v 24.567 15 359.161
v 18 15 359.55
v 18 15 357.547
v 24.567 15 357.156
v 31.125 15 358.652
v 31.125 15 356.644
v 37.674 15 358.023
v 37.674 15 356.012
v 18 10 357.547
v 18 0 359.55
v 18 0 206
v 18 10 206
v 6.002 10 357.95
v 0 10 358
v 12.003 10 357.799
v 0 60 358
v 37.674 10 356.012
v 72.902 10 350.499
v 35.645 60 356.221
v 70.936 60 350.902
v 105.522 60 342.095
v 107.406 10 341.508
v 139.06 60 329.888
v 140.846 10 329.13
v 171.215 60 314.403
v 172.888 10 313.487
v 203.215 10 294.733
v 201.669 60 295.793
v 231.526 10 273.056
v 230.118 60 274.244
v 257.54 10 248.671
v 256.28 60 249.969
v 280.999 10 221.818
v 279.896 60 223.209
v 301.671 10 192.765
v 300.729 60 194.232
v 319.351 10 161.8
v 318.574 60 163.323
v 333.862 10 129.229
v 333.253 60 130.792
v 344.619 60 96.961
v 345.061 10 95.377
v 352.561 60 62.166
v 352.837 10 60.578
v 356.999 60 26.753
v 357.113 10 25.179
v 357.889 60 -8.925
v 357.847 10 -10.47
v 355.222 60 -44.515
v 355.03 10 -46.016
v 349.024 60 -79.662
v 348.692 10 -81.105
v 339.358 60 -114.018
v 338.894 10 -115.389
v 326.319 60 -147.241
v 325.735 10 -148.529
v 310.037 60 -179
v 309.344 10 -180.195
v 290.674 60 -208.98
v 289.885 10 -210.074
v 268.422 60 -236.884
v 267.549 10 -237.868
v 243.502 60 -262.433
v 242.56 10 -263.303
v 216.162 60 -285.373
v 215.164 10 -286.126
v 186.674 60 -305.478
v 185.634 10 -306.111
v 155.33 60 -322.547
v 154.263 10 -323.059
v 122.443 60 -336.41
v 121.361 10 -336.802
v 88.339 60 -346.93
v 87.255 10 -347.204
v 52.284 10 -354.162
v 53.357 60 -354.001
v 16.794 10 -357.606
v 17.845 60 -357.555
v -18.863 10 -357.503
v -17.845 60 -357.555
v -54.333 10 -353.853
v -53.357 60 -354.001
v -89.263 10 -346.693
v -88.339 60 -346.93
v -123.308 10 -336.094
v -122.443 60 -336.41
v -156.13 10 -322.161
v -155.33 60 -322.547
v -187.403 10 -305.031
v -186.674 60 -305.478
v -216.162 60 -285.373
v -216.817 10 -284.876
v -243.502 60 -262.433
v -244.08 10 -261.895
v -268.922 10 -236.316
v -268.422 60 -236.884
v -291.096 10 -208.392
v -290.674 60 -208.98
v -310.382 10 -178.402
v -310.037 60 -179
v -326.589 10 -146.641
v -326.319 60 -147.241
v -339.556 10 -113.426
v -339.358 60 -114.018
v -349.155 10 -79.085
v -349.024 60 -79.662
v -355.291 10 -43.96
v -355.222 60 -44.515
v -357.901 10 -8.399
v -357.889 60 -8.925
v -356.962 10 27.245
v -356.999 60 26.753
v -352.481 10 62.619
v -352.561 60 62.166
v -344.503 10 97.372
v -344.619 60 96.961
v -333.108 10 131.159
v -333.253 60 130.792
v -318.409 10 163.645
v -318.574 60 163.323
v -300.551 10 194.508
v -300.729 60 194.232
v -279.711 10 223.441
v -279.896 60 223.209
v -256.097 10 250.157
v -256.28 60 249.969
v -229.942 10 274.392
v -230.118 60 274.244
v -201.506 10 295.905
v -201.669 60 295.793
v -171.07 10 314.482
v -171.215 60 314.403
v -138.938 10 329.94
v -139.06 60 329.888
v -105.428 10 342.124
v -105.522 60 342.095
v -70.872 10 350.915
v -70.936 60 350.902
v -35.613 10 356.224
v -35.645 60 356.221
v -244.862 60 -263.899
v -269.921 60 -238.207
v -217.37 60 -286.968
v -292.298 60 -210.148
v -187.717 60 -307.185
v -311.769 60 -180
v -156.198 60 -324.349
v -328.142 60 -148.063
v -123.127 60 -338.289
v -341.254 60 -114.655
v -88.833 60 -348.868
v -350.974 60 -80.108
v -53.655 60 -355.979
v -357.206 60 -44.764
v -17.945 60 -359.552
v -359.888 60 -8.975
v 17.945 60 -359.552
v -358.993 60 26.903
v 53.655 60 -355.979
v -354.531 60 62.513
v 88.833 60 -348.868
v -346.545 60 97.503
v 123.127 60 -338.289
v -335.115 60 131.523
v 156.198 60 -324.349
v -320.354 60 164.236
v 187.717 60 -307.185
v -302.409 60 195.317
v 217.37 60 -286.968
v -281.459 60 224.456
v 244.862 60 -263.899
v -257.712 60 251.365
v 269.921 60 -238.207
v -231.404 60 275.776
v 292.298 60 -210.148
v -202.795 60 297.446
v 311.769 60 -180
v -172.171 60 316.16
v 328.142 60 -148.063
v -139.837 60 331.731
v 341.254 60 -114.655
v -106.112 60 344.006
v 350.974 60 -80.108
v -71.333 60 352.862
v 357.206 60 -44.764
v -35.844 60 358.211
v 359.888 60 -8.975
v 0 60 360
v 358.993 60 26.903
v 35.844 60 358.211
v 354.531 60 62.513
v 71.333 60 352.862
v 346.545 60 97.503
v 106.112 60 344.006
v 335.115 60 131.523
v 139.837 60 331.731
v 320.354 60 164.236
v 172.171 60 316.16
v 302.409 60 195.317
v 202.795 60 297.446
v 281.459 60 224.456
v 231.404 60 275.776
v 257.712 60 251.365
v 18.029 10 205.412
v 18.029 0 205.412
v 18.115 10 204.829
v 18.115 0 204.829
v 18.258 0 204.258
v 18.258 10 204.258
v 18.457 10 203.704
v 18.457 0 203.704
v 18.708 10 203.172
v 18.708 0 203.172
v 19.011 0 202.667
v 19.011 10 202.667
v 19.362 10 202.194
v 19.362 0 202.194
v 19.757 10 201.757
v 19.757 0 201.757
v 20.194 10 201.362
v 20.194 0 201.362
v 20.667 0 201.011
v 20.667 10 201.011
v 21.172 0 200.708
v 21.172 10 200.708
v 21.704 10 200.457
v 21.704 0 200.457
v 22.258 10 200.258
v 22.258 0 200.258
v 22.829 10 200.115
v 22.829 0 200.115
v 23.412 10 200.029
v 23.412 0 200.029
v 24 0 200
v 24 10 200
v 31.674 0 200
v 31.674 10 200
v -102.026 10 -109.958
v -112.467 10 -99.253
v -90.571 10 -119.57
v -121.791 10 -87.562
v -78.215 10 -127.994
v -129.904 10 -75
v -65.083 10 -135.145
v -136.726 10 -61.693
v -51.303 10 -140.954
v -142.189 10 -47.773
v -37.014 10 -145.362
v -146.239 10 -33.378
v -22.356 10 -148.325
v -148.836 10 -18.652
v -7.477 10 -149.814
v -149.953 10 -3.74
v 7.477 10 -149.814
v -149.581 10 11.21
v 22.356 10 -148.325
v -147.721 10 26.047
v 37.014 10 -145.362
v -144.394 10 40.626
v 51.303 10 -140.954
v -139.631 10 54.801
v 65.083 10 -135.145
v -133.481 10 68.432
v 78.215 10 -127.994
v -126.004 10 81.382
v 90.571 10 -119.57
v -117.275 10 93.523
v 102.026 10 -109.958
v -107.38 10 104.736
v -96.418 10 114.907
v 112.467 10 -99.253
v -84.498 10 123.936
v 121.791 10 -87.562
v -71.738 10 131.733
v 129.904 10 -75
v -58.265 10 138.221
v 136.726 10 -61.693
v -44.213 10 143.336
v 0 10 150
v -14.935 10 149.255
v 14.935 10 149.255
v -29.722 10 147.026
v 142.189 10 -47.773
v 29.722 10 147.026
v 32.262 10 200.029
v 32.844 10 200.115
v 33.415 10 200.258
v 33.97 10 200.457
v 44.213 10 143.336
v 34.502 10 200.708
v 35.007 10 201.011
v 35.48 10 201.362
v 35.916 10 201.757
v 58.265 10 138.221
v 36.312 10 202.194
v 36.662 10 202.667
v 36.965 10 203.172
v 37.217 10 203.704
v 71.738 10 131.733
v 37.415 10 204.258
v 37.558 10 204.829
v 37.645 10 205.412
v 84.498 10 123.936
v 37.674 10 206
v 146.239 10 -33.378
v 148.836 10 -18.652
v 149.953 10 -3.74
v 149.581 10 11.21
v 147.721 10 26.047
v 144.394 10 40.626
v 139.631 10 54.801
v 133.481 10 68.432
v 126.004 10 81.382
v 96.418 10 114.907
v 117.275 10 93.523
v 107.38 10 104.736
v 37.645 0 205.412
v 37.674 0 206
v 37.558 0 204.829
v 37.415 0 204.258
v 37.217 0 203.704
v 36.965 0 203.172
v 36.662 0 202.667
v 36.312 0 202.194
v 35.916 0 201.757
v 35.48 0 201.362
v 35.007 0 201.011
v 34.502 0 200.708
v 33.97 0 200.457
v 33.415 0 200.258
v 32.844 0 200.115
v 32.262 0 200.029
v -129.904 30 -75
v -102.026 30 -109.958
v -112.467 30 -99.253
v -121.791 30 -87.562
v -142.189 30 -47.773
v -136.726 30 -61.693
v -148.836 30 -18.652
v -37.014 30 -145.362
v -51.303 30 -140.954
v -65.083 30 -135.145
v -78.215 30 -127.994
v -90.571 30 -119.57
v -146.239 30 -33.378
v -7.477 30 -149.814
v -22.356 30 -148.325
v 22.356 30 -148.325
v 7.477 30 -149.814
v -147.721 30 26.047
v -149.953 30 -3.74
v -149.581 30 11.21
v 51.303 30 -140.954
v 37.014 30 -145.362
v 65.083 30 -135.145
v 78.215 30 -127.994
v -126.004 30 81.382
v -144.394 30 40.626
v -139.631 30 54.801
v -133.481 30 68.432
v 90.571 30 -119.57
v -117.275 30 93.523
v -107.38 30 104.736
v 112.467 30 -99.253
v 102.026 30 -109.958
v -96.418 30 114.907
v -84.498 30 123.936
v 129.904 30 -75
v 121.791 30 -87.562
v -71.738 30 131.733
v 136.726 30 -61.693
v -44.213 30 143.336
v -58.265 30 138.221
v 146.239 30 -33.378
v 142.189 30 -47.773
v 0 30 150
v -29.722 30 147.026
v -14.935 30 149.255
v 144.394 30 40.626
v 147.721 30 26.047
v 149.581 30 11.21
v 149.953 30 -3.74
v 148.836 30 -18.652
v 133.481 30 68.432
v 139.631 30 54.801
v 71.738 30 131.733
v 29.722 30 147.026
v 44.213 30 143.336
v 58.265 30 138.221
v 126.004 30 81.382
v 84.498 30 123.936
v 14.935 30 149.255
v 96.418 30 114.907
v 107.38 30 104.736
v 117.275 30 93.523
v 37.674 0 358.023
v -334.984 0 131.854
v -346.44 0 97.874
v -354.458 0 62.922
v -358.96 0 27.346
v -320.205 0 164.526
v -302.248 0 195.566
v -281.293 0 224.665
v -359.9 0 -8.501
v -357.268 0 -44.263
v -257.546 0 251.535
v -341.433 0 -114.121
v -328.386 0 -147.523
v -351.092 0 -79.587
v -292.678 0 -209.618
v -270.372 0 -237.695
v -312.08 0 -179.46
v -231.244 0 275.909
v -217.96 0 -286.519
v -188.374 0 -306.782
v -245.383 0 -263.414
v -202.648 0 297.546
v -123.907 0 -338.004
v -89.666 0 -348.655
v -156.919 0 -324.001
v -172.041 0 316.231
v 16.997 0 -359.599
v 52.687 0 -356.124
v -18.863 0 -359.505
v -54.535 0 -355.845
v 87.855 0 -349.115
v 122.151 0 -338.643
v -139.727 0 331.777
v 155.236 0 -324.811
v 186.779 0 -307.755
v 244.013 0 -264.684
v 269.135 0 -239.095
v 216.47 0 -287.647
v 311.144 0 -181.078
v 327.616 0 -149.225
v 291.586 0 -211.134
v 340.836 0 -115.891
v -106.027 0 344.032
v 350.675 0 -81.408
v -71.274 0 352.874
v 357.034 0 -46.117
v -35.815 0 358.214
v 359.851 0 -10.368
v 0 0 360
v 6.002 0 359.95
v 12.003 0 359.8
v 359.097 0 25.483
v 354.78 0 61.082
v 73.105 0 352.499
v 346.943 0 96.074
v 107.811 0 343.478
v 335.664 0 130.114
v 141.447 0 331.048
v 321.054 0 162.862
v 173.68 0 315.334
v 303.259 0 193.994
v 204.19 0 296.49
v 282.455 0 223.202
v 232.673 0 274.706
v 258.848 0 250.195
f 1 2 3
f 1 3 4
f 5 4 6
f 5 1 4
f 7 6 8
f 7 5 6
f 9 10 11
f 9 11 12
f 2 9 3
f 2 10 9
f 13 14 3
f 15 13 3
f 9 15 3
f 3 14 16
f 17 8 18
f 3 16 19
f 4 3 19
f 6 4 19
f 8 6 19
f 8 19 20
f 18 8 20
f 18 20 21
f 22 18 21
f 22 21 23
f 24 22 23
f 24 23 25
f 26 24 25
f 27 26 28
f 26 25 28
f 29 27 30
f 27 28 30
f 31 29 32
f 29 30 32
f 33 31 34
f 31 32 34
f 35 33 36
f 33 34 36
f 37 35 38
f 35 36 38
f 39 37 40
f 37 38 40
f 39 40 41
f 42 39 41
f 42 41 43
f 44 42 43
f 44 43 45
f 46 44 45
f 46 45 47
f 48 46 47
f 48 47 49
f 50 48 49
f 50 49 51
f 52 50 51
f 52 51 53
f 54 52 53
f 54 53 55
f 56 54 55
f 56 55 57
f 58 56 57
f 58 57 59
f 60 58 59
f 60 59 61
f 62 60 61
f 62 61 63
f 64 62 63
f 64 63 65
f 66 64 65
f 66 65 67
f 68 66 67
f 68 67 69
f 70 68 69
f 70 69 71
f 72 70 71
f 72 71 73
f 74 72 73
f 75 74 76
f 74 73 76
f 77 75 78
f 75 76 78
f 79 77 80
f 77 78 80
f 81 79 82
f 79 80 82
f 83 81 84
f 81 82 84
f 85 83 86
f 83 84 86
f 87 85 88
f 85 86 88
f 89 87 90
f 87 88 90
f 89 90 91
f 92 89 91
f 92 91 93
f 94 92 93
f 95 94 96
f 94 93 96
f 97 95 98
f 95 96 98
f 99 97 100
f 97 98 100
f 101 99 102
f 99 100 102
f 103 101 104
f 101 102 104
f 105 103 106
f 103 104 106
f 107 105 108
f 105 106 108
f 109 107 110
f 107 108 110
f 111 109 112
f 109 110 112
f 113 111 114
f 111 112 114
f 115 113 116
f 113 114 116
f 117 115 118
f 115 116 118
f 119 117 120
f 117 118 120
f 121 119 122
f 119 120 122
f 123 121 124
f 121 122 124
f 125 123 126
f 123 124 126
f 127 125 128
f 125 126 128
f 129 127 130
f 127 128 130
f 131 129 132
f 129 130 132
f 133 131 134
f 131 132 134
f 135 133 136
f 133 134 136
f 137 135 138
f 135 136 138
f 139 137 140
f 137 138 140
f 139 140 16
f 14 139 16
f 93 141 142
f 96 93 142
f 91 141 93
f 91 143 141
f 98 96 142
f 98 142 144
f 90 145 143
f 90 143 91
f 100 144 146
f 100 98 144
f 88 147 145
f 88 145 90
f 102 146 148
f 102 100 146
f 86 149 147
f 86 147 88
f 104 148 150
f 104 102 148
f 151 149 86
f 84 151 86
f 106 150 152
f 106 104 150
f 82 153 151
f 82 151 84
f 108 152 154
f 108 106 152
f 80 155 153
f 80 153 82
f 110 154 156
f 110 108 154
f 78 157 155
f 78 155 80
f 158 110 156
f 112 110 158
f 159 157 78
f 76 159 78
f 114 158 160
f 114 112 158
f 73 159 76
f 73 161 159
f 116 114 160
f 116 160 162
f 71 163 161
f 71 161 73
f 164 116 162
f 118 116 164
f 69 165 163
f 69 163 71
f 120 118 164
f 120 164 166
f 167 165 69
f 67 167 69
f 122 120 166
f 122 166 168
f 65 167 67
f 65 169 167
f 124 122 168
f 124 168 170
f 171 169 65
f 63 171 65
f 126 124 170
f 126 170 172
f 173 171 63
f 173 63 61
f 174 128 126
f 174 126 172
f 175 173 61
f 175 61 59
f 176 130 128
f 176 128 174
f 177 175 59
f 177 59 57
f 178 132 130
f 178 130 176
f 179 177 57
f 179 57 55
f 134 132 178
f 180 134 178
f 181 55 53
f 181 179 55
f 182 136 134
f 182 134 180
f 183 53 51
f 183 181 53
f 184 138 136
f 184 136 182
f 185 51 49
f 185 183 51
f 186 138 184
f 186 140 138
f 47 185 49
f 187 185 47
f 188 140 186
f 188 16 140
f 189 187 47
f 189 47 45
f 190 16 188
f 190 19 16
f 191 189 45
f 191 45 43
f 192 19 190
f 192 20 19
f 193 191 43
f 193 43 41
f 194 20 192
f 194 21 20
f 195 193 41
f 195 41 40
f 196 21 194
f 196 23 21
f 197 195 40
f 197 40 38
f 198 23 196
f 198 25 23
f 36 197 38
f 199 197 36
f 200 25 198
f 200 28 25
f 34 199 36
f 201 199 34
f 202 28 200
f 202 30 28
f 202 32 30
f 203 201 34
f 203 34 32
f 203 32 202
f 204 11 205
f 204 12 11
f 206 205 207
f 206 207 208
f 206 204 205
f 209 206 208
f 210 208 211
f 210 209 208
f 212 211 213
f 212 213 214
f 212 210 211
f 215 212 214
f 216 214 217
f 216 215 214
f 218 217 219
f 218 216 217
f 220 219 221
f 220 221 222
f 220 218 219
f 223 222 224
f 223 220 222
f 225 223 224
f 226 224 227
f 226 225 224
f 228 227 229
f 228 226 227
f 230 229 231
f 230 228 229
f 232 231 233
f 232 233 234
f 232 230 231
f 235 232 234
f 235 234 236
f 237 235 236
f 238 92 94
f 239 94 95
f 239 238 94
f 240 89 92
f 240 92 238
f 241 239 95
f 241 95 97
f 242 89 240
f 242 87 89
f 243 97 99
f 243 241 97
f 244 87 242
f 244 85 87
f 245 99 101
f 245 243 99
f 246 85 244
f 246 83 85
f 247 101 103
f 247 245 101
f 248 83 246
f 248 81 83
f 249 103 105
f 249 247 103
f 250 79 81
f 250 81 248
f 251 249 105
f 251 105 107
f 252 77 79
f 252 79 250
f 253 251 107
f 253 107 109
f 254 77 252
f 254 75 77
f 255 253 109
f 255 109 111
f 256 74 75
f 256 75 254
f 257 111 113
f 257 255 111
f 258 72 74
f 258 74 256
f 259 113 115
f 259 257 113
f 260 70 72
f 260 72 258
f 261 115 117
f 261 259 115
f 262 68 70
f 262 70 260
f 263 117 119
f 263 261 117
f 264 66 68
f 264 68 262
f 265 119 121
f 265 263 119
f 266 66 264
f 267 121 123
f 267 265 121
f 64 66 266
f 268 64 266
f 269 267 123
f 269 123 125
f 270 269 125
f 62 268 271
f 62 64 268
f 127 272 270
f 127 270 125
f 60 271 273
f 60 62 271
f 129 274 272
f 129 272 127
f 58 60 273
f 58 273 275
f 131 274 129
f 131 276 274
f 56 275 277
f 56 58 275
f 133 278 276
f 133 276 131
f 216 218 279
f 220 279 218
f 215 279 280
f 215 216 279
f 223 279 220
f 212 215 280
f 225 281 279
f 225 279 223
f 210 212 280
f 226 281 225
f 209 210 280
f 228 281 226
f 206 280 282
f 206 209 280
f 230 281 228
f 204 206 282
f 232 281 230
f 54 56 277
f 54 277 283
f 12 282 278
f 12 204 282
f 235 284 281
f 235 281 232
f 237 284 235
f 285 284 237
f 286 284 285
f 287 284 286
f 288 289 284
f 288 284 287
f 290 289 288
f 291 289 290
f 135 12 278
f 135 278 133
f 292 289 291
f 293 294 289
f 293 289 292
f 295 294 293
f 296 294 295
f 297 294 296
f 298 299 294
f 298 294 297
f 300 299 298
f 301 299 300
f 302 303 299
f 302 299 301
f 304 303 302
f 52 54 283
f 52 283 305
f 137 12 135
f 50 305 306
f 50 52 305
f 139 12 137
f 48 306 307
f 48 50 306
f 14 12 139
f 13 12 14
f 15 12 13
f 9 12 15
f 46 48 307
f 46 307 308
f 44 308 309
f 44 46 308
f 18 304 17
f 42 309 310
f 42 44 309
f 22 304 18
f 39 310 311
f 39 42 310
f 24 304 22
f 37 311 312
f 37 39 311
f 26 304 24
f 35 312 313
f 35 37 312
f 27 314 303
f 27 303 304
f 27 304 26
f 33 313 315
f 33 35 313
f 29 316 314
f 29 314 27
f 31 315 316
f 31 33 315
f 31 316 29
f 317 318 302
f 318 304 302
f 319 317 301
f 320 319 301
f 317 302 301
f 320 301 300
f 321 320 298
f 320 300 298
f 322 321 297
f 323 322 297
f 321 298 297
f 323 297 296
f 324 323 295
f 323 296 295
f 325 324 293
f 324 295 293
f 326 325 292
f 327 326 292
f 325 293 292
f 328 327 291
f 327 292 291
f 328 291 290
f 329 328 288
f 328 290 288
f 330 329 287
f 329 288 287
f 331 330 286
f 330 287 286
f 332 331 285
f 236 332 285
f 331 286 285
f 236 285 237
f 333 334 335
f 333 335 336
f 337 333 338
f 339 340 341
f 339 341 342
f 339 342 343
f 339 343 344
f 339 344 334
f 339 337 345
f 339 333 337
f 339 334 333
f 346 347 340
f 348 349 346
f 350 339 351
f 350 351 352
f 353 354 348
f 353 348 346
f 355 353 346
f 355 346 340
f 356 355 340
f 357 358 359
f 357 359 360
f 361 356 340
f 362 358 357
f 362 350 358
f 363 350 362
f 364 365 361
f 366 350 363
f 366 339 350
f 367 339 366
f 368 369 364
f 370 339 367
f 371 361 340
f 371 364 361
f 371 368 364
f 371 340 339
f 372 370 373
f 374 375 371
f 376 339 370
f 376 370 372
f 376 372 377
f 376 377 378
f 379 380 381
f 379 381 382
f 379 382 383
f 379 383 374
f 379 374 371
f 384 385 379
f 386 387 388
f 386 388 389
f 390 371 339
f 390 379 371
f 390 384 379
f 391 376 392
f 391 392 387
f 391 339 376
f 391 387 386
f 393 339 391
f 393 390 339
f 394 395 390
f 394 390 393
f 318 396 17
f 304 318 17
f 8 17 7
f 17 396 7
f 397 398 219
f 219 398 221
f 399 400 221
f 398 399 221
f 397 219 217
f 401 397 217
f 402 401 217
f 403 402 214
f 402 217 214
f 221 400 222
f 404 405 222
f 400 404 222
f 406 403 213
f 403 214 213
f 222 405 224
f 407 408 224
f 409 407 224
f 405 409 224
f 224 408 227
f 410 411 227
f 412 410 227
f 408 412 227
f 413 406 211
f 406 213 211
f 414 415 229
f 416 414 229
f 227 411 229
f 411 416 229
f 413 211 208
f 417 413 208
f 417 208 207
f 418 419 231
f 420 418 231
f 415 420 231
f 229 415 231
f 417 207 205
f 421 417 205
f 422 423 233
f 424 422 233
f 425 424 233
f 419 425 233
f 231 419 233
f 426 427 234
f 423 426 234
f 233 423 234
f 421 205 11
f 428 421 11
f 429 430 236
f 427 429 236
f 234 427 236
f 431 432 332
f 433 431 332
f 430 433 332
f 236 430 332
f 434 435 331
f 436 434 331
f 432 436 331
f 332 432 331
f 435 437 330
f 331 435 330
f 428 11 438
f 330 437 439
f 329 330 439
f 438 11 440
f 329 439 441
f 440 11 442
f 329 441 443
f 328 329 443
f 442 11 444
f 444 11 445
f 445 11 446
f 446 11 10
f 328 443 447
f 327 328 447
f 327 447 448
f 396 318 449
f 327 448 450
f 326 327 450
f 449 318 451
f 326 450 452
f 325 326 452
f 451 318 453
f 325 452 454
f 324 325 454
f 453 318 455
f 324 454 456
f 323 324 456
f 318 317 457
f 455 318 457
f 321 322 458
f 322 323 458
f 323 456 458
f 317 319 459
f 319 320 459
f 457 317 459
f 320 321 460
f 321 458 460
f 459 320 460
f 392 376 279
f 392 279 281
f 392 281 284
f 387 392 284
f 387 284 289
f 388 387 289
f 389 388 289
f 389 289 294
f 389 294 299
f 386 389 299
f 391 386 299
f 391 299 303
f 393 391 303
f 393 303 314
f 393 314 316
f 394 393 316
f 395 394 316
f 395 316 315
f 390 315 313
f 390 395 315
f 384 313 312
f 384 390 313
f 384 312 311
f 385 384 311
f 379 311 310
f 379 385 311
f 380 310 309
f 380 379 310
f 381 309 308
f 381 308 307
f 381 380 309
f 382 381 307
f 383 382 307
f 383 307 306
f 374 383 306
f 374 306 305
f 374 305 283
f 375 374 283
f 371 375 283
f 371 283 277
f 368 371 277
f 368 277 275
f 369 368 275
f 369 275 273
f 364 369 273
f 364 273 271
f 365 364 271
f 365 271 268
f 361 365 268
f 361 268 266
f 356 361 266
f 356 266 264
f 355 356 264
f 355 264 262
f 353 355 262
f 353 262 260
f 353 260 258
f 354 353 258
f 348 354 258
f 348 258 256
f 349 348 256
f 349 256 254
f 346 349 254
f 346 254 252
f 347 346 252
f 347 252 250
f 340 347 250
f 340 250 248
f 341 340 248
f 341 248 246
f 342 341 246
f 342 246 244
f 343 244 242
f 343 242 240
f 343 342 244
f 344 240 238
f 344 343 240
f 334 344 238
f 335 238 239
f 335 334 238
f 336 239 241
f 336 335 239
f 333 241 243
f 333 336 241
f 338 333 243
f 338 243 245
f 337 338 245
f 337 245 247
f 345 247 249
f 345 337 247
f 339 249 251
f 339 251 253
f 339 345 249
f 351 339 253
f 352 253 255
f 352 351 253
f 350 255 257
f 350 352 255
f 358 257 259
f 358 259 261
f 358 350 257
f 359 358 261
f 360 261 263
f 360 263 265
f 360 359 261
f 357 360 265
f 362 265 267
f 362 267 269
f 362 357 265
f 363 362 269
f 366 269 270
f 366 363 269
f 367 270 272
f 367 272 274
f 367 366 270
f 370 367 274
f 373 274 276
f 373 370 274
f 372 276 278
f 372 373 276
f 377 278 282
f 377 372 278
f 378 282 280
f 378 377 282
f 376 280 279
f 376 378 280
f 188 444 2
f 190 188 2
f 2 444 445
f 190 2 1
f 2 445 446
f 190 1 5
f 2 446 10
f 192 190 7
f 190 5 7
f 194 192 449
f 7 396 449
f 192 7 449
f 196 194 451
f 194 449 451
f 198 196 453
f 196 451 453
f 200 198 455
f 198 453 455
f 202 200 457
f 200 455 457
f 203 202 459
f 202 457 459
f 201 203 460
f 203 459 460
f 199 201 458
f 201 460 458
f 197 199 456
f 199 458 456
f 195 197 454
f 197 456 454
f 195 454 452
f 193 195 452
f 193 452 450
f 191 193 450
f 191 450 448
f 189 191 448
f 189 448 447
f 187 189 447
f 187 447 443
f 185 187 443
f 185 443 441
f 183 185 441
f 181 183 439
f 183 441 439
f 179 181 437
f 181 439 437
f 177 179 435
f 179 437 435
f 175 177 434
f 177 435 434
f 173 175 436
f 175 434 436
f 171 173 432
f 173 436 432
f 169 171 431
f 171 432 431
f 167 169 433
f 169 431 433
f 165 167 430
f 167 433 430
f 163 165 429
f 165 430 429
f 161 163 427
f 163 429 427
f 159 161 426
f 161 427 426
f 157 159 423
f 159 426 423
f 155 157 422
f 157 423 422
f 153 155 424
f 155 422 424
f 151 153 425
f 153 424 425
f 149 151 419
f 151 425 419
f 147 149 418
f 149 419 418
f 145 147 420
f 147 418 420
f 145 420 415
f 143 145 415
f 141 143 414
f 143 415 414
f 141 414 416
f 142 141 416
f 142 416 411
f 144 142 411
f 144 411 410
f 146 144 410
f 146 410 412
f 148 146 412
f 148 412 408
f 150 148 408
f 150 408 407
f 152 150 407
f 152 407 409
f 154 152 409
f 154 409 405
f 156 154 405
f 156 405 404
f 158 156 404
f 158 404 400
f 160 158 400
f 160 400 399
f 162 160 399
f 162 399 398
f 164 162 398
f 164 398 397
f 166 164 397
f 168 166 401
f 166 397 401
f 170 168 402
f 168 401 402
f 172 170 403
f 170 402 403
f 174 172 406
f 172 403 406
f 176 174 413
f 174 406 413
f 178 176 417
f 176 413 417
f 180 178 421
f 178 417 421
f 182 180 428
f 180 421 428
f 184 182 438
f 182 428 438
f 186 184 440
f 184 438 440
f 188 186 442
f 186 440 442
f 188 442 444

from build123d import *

# Parameters (mm, degrees)
SKETCH1_R           = 360
BOSS_EXTRUDE1_DEPTH = 60
SKETCH2_R           = 358
SKETCH2_R_2         = 150
CUT_EXTRUDE1_DEPTH  = 50
SKETCH3_W           = 19.673543
SKETCH3_H           = 15
CUT_EXTRUDE2_DEPTH  = 160
MOVE_FACE1_BY       = 30
FILLET1_R           = 6


with BuildPart() as part:
    # Sketch1 → Boss-Extrude1 (new body)
    with BuildSketch(Plane(origin=(0, 0, 0), x_dir=(1, 0, 0), z_dir=(0, 1, 0))):
        with Locations(Location((0, 0, 0), (0, 0, 270))):
            Circle(SKETCH1_R)
    extrude(amount=BOSS_EXTRUDE1_DEPTH)

    # Sketch2 → Cut-Extrude1 (cut)
    with BuildSketch(Plane(origin=(0, 60, 0), x_dir=(1, 0, 0), z_dir=(0, 1, 0))):
        with Locations(Location((0, 0, 0), (0, 0, 270))):
            Circle(SKETCH2_R)
        with Locations(Location((0, 0, 0), (0, 0, 270))):
            Circle(SKETCH2_R_2, mode=Mode.SUBTRACT)
    extrude(amount=-CUT_EXTRUDE1_DEPTH, mode=Mode.SUBTRACT)

    # Sketch3 → Cut-Extrude2 (cut)
    with BuildSketch(Plane.XY.offset(360)):
        with Locations((27.8367715, 7.5)):
            Rectangle(SKETCH3_W, SKETCH3_H)
    extrude(amount=-CUT_EXTRUDE2_DEPTH, mode=Mode.SUBTRACT)

    # Move Face1: a face moved inward by 30.0
    extrude(part.faces().sort_by_distance((0, 60, 0))[0], amount=MOVE_FACE1_BY, dir=(0, -1, 0), mode=Mode.SUBTRACT)

    # Fillet1
    fillet1_edges = [part.edges().sort_by_distance(p)[0] for p in [
        (18, 5, 200),
        (37.673543, 5, 200),
    ]]
    fillet(fillet1_edges, radius=FILLET1_R)


solid = part.part
